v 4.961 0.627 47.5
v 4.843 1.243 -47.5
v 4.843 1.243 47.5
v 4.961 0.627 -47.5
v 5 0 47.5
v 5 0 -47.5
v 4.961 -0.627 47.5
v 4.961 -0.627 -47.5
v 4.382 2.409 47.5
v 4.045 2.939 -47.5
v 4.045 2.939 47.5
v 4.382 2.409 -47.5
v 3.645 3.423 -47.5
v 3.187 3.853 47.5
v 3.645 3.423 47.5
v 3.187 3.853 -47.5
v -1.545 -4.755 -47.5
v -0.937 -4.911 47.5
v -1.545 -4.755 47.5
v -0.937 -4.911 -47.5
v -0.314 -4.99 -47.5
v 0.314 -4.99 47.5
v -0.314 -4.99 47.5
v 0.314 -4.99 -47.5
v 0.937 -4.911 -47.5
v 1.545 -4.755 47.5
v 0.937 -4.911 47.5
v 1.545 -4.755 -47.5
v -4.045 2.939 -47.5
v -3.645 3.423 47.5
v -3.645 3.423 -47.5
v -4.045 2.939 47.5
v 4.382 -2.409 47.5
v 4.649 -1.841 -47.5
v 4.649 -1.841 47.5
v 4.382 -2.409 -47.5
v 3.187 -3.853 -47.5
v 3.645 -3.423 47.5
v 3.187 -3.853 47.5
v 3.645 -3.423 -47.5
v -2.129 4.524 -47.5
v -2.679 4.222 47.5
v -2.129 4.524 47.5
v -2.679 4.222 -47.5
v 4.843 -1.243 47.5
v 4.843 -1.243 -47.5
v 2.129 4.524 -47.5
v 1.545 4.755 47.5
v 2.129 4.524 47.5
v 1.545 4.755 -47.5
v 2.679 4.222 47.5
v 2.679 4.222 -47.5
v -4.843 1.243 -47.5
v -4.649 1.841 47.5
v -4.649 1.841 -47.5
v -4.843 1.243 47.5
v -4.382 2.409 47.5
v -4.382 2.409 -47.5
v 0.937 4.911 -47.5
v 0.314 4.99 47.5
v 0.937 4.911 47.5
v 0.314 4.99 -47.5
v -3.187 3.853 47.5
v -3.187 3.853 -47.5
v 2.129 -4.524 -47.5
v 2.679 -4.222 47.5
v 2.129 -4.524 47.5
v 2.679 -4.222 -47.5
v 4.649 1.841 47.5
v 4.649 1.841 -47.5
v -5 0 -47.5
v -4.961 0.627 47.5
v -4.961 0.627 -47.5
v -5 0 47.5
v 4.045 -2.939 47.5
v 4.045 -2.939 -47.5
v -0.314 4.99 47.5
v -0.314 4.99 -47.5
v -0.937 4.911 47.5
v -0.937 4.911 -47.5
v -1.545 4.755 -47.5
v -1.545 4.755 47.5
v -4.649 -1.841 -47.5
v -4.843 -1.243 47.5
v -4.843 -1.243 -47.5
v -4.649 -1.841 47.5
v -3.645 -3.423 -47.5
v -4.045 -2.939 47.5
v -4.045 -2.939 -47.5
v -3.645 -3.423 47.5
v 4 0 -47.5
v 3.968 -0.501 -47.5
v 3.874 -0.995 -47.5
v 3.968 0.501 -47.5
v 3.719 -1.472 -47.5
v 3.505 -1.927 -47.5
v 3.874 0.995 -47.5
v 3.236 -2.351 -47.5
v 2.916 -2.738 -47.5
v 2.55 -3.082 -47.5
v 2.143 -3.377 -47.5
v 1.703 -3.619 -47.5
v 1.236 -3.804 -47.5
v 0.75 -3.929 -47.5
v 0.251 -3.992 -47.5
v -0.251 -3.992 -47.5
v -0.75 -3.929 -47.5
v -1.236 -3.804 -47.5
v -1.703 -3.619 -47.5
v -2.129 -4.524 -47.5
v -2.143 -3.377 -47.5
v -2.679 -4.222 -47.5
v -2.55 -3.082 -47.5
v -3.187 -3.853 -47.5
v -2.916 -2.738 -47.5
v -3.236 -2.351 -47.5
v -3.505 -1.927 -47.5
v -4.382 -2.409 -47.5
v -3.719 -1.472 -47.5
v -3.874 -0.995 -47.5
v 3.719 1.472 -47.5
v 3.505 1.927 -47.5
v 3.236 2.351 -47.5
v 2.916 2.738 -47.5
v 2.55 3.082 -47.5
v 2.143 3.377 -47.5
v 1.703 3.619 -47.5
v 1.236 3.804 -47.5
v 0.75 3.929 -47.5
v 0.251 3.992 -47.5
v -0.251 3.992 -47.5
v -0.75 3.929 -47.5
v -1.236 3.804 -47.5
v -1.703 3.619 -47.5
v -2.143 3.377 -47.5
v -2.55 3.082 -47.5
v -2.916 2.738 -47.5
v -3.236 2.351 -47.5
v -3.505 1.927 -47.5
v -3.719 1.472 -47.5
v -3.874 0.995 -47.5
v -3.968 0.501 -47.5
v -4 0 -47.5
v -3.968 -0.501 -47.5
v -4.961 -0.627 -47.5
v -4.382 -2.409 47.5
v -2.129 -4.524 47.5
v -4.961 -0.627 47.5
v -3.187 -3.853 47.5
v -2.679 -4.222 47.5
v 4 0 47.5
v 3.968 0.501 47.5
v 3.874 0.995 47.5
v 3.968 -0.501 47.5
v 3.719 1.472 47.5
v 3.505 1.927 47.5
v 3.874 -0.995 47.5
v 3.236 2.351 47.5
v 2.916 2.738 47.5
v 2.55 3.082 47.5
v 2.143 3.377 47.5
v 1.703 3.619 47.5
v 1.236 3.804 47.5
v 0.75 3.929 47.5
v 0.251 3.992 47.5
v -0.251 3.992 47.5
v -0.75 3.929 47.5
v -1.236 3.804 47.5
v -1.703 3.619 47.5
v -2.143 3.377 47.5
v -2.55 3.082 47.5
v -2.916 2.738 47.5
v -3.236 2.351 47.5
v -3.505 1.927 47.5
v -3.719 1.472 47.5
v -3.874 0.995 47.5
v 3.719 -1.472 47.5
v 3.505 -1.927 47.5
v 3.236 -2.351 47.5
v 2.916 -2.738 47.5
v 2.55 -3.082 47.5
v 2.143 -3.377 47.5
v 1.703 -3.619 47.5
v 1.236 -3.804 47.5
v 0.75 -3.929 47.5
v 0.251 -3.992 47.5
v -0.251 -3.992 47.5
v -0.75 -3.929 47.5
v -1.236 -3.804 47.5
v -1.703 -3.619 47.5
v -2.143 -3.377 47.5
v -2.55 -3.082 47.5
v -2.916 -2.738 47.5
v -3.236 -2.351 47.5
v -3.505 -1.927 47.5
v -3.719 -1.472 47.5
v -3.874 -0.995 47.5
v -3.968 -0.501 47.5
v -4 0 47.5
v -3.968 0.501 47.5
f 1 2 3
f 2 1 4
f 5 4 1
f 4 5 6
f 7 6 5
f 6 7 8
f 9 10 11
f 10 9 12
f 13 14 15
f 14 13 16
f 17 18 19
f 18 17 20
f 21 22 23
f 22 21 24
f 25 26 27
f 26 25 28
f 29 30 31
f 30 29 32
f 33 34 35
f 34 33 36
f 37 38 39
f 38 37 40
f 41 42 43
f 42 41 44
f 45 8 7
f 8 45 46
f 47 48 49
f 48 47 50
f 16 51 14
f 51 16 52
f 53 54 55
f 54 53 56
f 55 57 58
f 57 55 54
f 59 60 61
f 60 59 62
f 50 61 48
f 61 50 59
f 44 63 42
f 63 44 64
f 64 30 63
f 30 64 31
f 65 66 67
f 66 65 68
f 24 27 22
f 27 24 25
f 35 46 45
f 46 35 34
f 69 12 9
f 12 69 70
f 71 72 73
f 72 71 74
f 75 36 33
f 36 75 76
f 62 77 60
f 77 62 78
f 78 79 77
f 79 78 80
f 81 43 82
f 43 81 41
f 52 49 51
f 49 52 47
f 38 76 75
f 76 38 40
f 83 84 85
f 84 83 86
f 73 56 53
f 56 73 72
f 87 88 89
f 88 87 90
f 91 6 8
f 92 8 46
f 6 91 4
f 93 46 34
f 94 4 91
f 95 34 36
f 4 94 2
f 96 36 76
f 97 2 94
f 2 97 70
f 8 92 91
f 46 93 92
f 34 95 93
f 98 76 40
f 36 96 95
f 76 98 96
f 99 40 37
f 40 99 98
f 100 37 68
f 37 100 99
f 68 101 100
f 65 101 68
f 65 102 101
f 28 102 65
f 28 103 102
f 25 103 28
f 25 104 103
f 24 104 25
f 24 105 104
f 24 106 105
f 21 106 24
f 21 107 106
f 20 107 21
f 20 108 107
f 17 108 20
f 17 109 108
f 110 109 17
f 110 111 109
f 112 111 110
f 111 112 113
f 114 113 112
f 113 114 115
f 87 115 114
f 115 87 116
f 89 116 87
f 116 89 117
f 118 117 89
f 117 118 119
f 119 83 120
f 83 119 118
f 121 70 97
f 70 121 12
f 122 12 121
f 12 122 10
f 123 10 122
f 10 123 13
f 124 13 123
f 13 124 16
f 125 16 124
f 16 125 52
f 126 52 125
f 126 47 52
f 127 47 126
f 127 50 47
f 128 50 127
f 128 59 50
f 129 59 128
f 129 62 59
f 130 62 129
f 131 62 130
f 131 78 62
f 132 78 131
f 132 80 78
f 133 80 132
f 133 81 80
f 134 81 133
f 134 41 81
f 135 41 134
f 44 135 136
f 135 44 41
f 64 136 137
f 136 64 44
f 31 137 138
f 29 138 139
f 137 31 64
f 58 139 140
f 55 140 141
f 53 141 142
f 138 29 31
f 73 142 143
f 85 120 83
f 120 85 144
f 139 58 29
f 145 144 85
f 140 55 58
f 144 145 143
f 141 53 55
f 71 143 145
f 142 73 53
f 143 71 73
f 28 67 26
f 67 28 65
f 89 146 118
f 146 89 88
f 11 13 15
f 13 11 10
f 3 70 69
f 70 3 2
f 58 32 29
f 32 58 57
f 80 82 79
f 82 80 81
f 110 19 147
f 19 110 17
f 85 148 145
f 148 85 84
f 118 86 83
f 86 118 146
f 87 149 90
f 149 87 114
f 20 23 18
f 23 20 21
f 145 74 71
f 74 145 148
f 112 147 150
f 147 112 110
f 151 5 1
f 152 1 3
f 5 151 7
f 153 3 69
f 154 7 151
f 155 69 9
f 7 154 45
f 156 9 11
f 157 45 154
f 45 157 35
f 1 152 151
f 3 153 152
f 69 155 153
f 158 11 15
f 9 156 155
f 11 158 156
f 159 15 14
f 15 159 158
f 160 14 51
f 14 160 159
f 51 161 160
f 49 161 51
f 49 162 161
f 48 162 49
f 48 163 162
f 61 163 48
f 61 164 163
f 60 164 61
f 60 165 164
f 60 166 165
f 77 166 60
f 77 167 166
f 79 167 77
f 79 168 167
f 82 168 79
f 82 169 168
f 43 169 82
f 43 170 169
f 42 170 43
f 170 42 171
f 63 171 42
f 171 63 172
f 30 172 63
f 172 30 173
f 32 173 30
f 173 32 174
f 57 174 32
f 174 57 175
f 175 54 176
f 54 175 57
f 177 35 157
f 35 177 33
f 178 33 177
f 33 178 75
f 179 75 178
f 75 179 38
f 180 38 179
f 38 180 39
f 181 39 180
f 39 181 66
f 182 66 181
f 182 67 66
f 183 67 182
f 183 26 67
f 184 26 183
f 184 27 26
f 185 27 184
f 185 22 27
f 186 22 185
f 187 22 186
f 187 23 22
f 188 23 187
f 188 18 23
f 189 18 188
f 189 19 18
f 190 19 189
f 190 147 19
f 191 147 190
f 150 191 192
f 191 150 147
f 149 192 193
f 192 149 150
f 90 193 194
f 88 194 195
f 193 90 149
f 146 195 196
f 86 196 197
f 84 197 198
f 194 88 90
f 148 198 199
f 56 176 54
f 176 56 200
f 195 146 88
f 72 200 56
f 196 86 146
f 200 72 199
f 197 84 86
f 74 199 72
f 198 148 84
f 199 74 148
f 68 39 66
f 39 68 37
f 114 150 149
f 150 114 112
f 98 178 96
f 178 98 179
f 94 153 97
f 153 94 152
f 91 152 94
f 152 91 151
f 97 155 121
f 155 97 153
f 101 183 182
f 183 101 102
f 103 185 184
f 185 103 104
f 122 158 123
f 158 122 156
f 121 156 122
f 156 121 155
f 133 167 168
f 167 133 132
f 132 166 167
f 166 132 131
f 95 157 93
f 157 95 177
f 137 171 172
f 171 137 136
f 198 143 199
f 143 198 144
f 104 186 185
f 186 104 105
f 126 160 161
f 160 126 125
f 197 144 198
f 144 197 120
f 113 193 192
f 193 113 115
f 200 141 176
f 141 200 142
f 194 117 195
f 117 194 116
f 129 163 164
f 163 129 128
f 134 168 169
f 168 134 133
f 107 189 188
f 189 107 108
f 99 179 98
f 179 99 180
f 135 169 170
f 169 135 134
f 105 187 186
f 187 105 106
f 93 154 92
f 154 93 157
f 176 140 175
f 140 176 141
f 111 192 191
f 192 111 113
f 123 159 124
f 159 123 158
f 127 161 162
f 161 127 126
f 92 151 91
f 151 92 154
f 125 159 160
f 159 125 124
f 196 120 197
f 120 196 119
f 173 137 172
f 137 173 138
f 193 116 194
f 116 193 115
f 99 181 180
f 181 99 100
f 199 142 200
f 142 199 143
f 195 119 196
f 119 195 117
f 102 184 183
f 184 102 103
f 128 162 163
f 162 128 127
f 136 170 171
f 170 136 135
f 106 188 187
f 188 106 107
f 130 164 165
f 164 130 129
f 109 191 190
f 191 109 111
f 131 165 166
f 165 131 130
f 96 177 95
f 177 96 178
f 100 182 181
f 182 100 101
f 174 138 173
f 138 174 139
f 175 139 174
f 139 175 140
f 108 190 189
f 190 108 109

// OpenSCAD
$fn = 50;


difference() {
	union() {
		translate(v = [0, 0, -47.5000000000]) {
			cylinder(h = 95, r = 5.0000000000);
		}
	}
	union() {
		translate(v = [0, 0, -100.0000000000]) {
			cylinder(h = 200, r = 4.0000000000);
		}
	}
}
